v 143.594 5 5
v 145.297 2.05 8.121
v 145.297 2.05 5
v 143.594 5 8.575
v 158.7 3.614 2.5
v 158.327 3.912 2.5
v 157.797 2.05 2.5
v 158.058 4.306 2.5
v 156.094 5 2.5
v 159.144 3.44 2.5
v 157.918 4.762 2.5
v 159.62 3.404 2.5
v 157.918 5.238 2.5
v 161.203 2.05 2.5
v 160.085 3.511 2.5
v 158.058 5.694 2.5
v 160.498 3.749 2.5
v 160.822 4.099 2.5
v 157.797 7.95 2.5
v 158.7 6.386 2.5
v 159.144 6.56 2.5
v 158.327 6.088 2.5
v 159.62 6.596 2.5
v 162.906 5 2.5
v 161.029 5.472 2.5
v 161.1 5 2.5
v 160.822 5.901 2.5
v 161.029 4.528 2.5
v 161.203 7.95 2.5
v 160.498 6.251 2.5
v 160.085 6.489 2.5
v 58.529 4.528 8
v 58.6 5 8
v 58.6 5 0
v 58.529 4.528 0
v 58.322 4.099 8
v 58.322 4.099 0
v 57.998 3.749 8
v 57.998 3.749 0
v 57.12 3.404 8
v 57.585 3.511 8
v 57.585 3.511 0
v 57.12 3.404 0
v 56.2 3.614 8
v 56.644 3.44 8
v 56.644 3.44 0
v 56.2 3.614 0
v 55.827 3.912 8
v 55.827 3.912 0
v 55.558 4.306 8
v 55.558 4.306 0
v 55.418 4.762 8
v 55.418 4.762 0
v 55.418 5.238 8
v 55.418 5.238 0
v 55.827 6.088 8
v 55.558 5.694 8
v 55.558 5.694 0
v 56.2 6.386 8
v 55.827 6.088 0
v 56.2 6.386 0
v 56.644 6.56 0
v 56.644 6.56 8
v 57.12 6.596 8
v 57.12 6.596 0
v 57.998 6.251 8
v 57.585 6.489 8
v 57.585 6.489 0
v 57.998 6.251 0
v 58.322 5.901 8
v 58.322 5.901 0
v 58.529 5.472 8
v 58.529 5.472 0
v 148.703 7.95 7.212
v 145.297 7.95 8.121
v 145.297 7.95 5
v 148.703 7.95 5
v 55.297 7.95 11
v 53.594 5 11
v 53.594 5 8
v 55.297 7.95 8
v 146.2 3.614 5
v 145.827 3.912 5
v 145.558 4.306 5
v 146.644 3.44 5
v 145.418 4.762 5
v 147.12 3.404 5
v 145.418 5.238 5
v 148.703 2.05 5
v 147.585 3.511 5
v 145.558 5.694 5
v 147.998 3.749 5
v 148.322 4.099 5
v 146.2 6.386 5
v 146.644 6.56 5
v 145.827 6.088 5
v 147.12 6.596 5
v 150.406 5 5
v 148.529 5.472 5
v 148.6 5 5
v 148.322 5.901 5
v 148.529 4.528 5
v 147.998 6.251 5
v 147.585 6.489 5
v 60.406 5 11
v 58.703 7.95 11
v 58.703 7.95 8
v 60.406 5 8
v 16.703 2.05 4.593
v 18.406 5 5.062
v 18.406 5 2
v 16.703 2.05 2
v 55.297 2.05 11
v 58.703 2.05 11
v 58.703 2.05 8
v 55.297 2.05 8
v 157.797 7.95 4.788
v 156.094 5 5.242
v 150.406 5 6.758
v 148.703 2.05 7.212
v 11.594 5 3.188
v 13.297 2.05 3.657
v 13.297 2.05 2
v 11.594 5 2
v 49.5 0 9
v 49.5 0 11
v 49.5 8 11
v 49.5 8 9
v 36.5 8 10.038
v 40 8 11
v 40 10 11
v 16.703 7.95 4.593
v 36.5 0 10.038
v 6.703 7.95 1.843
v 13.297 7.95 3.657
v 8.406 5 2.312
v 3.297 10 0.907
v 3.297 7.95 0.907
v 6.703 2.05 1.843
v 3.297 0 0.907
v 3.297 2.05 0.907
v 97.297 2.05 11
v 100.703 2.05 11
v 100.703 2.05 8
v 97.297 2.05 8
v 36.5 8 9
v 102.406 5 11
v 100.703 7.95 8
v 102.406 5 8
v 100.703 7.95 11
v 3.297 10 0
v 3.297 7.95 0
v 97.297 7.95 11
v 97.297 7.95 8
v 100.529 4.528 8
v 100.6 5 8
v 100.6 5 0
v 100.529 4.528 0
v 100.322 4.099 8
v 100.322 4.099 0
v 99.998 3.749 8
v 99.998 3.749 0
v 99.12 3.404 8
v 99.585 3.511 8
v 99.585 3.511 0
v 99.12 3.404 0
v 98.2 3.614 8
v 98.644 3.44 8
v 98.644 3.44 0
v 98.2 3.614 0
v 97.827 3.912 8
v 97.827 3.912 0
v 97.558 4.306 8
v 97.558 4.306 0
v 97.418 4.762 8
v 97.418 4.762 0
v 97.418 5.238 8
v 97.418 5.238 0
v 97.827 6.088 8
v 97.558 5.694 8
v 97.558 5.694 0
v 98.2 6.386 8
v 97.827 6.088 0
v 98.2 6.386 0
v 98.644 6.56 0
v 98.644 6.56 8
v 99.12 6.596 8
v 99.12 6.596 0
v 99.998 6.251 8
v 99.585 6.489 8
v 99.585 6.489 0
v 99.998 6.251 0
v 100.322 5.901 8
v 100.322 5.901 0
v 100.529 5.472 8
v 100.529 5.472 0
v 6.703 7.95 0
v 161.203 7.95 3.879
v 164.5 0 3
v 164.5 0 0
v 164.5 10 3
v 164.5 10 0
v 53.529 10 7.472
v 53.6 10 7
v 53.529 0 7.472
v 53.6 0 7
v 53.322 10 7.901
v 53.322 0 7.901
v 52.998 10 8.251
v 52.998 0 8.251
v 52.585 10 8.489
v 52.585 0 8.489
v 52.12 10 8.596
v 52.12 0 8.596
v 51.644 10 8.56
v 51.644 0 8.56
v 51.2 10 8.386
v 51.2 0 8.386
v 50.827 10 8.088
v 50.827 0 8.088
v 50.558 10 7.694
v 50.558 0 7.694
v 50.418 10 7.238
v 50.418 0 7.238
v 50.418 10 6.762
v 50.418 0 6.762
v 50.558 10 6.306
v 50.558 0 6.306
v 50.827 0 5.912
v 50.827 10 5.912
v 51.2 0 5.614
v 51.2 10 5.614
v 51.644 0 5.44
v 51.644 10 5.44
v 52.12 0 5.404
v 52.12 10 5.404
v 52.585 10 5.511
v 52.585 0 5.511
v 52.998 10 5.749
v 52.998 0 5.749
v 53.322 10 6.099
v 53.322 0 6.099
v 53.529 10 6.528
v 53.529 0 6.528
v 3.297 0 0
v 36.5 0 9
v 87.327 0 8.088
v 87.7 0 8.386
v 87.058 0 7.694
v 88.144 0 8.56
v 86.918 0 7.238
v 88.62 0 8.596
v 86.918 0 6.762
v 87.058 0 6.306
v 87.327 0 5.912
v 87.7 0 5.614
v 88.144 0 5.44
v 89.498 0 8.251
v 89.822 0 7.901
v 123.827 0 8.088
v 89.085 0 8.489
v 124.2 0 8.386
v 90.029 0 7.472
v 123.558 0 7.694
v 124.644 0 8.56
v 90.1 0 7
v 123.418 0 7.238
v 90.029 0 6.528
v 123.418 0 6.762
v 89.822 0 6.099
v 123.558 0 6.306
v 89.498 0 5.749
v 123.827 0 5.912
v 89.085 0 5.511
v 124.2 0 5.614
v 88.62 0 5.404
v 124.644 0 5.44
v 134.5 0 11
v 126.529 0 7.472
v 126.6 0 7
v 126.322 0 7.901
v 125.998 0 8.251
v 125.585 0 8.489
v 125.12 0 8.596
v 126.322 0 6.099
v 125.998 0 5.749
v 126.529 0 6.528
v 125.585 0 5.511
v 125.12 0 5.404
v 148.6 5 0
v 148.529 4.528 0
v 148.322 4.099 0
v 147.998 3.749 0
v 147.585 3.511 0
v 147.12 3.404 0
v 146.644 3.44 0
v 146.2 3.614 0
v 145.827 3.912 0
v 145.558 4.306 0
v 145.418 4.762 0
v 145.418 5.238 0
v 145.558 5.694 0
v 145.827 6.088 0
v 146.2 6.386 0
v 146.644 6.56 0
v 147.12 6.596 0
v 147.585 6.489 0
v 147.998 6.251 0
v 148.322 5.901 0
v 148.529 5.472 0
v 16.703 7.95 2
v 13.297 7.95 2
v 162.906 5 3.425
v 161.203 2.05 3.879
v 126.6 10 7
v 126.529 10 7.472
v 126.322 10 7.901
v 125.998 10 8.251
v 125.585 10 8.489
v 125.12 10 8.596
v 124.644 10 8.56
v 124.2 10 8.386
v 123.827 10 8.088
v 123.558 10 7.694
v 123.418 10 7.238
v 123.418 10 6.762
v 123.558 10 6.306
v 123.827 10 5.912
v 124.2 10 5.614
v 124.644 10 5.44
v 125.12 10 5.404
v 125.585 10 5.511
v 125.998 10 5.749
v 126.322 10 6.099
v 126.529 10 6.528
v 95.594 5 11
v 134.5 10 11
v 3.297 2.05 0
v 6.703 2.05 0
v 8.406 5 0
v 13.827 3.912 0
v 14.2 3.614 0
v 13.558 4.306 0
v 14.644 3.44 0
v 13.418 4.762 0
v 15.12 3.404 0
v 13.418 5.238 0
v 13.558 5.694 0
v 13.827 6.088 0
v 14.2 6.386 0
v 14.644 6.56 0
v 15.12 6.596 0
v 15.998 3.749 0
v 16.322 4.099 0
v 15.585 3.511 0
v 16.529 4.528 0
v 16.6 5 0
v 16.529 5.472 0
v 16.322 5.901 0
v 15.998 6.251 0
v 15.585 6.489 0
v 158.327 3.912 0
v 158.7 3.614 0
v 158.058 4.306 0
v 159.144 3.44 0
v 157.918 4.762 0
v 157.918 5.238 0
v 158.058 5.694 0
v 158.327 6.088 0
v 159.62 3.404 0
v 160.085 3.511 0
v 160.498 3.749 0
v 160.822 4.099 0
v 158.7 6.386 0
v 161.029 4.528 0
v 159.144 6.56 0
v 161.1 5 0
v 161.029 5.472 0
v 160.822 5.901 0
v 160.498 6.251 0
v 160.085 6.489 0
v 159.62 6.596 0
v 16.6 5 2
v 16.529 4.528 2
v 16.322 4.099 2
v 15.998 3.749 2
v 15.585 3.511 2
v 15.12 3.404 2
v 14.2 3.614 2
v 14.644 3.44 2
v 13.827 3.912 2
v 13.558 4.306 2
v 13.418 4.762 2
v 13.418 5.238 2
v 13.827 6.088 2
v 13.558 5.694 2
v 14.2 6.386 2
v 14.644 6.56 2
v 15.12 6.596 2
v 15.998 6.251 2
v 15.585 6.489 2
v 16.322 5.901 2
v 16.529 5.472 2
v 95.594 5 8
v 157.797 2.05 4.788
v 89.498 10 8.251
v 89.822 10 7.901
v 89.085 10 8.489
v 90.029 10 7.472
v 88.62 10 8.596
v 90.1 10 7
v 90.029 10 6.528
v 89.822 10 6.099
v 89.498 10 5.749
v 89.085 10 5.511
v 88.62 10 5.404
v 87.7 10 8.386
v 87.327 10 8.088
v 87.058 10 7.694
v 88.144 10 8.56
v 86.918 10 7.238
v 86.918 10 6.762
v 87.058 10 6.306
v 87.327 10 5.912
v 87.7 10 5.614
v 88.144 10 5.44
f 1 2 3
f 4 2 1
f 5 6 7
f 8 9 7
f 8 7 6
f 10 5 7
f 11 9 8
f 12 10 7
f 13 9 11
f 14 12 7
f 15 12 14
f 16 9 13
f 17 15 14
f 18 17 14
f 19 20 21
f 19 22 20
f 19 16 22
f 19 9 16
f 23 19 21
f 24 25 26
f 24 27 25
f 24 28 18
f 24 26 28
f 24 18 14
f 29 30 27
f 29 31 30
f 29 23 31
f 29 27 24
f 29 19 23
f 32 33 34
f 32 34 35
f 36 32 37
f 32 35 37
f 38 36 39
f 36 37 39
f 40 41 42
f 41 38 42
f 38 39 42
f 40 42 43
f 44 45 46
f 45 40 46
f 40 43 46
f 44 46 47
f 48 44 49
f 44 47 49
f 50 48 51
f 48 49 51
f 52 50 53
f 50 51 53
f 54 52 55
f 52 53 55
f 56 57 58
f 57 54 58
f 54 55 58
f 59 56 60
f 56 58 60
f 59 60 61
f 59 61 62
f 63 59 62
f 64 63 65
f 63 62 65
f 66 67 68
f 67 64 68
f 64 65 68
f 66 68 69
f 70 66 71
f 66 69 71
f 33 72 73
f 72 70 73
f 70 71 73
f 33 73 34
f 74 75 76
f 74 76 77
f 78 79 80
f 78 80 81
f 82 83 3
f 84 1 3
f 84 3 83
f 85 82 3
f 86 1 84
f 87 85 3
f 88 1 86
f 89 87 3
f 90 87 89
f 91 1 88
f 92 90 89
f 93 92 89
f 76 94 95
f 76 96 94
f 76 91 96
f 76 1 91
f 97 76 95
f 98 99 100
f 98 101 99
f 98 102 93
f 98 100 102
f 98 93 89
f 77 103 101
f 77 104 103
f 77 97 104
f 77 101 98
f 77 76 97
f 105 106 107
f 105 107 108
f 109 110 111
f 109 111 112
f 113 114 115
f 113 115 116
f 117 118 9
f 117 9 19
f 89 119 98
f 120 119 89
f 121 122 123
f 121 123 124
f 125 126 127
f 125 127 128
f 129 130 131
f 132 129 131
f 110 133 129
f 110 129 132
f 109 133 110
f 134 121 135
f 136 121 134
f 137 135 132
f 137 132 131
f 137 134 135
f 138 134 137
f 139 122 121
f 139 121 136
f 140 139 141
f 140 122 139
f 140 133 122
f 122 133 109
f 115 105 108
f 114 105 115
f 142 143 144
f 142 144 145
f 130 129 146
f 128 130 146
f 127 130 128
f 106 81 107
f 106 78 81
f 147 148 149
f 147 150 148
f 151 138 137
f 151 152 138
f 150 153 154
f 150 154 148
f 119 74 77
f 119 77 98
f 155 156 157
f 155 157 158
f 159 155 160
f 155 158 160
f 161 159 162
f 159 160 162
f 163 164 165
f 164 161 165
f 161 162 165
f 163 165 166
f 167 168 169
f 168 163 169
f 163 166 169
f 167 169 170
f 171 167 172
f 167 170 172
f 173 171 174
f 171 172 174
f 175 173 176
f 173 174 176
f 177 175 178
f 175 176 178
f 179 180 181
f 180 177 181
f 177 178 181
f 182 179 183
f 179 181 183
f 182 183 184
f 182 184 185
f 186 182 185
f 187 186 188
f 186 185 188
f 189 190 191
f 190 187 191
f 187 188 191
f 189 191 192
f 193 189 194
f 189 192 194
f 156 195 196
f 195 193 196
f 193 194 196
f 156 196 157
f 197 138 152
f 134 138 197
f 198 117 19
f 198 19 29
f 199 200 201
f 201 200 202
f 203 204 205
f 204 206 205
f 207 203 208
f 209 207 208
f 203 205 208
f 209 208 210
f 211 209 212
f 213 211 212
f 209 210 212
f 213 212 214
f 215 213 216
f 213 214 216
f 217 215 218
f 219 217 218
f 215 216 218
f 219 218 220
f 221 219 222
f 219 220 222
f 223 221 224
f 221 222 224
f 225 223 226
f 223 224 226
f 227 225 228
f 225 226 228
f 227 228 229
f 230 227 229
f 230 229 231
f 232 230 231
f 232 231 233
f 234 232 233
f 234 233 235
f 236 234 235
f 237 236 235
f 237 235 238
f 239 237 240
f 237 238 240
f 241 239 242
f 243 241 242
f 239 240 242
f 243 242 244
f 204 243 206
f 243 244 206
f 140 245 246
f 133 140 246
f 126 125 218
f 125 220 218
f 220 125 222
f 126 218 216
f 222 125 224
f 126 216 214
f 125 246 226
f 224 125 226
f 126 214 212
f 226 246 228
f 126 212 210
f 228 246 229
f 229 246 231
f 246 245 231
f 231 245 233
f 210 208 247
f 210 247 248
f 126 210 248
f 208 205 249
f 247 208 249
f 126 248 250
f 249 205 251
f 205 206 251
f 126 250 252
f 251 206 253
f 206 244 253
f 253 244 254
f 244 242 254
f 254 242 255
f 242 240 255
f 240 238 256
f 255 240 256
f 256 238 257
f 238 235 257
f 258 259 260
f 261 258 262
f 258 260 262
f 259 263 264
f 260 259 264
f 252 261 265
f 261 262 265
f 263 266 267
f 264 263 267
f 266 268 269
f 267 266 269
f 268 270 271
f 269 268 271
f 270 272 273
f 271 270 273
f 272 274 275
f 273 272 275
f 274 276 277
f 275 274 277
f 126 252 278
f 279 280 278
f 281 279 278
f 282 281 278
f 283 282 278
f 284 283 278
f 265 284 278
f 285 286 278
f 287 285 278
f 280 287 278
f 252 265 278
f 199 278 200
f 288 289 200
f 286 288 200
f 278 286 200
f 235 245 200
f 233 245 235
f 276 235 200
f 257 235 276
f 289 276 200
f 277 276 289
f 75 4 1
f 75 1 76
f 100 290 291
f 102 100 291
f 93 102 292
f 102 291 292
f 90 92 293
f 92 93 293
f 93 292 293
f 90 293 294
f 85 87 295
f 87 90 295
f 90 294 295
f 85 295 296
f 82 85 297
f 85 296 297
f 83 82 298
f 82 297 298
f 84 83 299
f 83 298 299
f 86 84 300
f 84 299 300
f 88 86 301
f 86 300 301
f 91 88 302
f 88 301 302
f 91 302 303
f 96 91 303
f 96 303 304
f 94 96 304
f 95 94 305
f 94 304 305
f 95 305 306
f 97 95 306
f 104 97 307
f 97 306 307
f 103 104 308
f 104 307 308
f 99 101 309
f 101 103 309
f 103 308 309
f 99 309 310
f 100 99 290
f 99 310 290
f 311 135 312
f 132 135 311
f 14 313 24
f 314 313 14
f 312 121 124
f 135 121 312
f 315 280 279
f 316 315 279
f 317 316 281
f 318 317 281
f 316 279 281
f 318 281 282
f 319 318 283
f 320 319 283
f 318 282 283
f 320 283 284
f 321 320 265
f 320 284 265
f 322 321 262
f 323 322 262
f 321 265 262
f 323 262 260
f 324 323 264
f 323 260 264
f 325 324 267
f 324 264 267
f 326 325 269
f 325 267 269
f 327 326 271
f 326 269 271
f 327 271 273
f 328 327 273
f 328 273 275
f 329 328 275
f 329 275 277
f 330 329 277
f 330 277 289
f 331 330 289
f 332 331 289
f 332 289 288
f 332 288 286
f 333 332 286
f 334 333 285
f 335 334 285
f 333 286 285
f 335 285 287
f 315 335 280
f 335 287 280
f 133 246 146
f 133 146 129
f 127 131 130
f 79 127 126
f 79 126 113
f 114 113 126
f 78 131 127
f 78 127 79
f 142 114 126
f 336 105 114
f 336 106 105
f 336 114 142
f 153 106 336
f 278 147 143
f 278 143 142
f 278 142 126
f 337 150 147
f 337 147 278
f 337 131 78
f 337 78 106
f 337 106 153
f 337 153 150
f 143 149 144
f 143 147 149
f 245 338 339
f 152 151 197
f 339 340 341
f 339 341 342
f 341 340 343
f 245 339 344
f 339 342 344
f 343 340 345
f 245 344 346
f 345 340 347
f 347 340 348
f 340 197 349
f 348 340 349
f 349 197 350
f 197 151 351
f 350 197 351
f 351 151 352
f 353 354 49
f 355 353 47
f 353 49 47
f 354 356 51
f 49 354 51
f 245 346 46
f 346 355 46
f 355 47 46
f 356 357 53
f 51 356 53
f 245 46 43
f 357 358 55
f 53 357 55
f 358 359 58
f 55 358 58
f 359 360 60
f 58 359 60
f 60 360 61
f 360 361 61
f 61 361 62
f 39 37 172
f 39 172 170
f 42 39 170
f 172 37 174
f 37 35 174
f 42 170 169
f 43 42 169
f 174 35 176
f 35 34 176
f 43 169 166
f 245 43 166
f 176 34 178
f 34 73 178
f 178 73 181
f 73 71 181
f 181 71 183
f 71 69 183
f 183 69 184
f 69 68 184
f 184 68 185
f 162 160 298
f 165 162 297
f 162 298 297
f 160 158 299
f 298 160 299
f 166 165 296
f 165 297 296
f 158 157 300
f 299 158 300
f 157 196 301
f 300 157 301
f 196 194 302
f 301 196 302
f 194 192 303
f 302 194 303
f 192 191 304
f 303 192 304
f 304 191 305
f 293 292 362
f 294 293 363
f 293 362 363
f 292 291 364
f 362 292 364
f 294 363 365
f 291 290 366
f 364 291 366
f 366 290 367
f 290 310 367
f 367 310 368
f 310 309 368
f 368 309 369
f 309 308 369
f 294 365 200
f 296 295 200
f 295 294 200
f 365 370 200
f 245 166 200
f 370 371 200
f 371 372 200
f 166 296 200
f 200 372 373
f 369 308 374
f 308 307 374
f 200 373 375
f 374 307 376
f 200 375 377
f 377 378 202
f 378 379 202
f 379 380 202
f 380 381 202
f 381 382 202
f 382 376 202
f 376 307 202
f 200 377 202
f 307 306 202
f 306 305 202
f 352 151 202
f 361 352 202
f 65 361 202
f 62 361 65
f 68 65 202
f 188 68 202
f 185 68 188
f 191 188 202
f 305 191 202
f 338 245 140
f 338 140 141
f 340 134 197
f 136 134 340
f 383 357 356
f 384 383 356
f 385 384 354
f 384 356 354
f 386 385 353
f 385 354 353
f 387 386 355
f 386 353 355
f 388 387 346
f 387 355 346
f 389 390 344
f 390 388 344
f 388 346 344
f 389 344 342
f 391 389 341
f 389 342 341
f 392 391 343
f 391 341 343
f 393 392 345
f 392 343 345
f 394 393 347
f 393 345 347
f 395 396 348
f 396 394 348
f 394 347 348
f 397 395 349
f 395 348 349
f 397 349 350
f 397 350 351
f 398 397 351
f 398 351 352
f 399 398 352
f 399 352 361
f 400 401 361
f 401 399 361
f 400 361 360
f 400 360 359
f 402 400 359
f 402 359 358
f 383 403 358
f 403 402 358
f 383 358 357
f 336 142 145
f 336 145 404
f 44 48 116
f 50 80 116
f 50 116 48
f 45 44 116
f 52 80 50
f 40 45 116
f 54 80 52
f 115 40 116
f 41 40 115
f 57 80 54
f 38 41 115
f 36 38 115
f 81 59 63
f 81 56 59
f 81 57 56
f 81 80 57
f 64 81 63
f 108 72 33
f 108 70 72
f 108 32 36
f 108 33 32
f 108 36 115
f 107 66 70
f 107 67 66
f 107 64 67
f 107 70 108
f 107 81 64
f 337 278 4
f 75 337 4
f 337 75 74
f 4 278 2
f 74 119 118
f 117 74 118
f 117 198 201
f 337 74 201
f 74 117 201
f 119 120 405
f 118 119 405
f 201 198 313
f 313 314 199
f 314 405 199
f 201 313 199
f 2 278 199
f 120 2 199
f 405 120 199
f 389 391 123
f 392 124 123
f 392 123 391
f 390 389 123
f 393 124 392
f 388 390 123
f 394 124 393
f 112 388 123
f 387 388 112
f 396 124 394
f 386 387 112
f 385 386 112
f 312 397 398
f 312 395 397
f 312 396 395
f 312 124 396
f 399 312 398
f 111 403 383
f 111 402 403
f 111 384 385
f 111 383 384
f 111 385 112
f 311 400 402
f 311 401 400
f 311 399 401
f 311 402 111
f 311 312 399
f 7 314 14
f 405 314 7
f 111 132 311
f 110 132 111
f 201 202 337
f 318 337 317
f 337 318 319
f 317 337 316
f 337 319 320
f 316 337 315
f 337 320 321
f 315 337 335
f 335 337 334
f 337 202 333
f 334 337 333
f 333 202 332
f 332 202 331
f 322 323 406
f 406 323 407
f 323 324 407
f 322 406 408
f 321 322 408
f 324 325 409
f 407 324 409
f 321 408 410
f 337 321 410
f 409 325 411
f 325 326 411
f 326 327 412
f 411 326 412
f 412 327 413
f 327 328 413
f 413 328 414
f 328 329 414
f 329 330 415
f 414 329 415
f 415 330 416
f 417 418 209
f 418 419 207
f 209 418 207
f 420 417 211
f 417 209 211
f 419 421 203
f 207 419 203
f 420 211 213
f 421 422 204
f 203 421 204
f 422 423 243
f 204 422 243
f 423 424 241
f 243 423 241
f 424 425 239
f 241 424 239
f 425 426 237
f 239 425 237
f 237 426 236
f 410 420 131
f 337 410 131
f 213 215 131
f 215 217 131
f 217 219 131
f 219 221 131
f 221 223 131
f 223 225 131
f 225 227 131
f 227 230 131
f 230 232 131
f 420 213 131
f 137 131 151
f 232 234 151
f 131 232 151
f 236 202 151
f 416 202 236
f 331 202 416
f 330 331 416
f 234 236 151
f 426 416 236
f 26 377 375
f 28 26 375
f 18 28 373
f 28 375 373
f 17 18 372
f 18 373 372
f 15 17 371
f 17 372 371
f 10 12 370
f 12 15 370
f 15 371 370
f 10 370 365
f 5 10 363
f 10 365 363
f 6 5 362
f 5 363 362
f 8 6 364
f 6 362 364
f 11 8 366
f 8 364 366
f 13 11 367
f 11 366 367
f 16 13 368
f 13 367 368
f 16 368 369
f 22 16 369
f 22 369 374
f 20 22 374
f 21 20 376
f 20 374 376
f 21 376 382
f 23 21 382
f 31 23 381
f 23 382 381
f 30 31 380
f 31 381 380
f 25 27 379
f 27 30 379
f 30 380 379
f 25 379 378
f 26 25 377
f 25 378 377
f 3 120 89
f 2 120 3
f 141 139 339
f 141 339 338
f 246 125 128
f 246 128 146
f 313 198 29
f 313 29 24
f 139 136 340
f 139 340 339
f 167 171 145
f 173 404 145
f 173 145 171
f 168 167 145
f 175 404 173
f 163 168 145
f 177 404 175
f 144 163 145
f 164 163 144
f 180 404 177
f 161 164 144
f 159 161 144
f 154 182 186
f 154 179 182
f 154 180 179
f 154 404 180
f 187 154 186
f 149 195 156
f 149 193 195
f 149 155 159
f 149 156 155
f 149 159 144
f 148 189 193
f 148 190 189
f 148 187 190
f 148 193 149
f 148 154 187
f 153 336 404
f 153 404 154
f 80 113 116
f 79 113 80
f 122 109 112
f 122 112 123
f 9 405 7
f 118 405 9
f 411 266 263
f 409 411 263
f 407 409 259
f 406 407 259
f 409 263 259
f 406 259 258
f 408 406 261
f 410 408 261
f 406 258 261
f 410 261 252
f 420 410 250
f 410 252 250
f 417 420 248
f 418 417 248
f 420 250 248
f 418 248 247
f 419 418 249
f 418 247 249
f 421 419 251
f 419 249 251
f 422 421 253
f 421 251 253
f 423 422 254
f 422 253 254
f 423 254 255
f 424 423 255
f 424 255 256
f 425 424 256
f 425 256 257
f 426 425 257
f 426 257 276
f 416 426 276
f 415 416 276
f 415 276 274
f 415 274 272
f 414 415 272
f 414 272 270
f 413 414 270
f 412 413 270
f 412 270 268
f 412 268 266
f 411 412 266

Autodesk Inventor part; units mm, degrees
ref_plane "YZ Plane" through (0, 0, 0) normal (1, 0, 0) x (0, 1, 0)
ref_plane "XZ Plane" through (0, 0, 0) normal (0, 1, 0) x (-1, 0, 0)
ref_plane "XY Plane" through (0, 0, 0) normal (0, 0, 1) x (1, 0, 0)
sketch "Sketch1" plane through (0, 0, 0) normal (0, 0, 1) x (1, 0, 0)
  line L0 (0, 0) -> (164.5, 0)
  line L1 (164.5, 0) -> (164.5, 10)
  line L2 (164.5, 10) -> (0, 10)
  line L3 (0, 10) -> (0, 0)
  circle A0 centre (57, 5) radius 1.6
  circle A1 centre (99, 5) radius 1.6
  circle A2 centre (159.5, 5) radius 1.6
  circle A3 centre (147, 5) radius 1.6
  circle A4 centre (15, 5) radius 1.6
  circle A5 centre (5, 5) radius 1.6
  dimension "d1" = 10
  dimension "d2" = 90
  dimension "d4" = 3.2
  dimension "d6" = 3.2
  dimension "d7" = 3.2
  dimension "d8" = 42
  dimension "d9" = 60.5
  dimension "d26" = 3.2
  dimension "d27" = 48
  dimension "d28" = 3.2
  dimension "d29" = 42
  dimension "d32" = 15
  dimension "d33" = 5
  dimension "d61" = 3.2
  dimension "d62" = 10
  dimension "d63" = 12.5
ref_plane "Work Plane2" through (0, 0, 0) normal (0, -1, 0) x (1, 0, 0)
sketch "Sketch2" plane through (0, 0, 0) normal (0, -1, 0) x (1, 0, 0)
  circle A0 centre (52, 7) radius 1.6
  circle A1 centre (125, 7) radius 1.6
  circle A2 centre (88.5, 7) radius 1.6
  point P0 (0, 0)
  dimension "d13" = 3.2
  dimension "d15" = 3.2
  dimension "d17" = 3.2
  dimension "d18" = 36.5
  dimension "d64" = 52
  dimension "d65" = 36.5
ref_plane "Work Plane1" through (0, 0, 11) normal (0, 0, 1) x (1, 0, 0)
extrude "klocek" add sketch "Sketch1" along normal blind 11
ref_plane "Work Plane3" through (0, 0, 0) normal (0, -1, 0) x (1, 0, 0)
extrude "prowadzenie osi" cut sketch "Sketch2" against normal up to next
ref_plane "Work Plane4" through (0, 0, 0) normal (0, -1, 0) x (1, 0, 0)
sketch "Sketch7" plane through (0, 0, 0) normal (0, -1, 0) x (1, 0, 0)
  line L0 (0, 11) -> (0, 0)
  line L1 (0, 11) -> (164.5, 11) projected
  line L2 (0, 11) -> (40, 11)
  line L3 (40, 11) -> (0, 0)
  point P0 (0, -1.8333)
  dimension "d86" = 11
  dimension "d87" = 40
sketch "Sketch8" plane through (0, 0, 0) normal (0, -1, 0) x (1, 0, 0)
  line L0 (164.5, 0) -> (164.5, 11) projected
  line L1 (164.5, 11) -> (164.5, 3)
  line L2 (164.5, 11) -> (0, 11) projected
  line L3 (164.5, 11) -> (134.5, 11)
  line L4 (134.5, 11) -> (164.5, 3)
  point P0 (0, 0)
  point P1 (40.8333, 11)
  dimension "d80" = 8
  dimension "d81" = 30
extrude "przedni skos" cut sketch "Sketch7" against normal up to next
extrude "tylni skos" cut sketch "Sketch8" against normal up to next
ref_plane "Work Plane7" through (0, 0, 11) normal (0, 0, 1) x (1, 0, 0)
sketch "Sketch5" plane through (0, 0, 11) normal (0, 0, 1) x (1, 0, 0)
  circle A0 centre (99, 5) radius 1.6 projected
  line L0 (95.5936, 5) -> (97.2968, 7.95)
  line L1 (97.2968, 7.95) -> (100.7032, 7.95)
  line L2 (100.7032, 7.95) -> (102.4064, 5)
  line L3 (102.4064, 5) -> (100.7032, 2.05)
  line L4 (100.7032, 2.05) -> (97.2968, 2.05)
  line L5 (97.2968, 2.05) -> (95.5936, 5)
  circle A1 centre (57, 5) radius 1.6 projected
  line L6 (60.4064, 5) -> (58.7032, 2.05)
  line L7 (58.7032, 2.05) -> (55.2968, 2.05)
  line L8 (55.2968, 2.05) -> (53.5936, 5)
  line L9 (53.5936, 5) -> (55.2968, 7.95)
  line L10 (55.2968, 7.95) -> (58.7032, 7.95)
  line L11 (58.7032, 7.95) -> (60.4064, 5)
  point P0 (119.5, 5)
  dimension "d98" = 5.9
  dimension "d100" = 5.9
extrude "hex insert middle" cut sketch "Sketch5" against normal blind 3
ref_plane "Work Plane6" through (0, 0, 11) normal (0, 0, 1) x (1, 0, 0)
sketch "Sketch9" plane through (0, 0, 11) normal (0, 0, 1) x (1, 0, 0)
  circle A0 centre (147, 5) radius 1.6 projected
  line L0 (150.4064, 5) -> (148.7032, 2.05)
  line L1 (148.7032, 2.05) -> (145.2968, 2.05)
  line L2 (145.2968, 2.05) -> (143.5936, 5)
  line L3 (143.5936, 5) -> (145.2968, 7.95)
  line L4 (145.2968, 7.95) -> (148.7032, 7.95)
  line L5 (148.7032, 7.95) -> (150.4064, 5)
  point P0 (0, 0)
  point P1 (153, 5)
  dimension "d99" = 5.9
extrude "hex insert rear 1" cut sketch "Sketch9" against normal blind 6
ref_plane "Work Plane5" through (0, 0, 11) normal (0, 0, 1) x (1, 0, 0)
sketch "Sketch10" plane through (0, 0, 11) normal (0, 0, 1) x (1, 0, 0)
  circle A0 centre (159.5, 5) radius 1.6 projected
  line L0 (162.9064, 5) -> (161.2032, 2.05)
  line L1 (161.2032, 2.05) -> (157.7968, 2.05)
  line L2 (157.7968, 2.05) -> (156.0936, 5)
  line L3 (156.0936, 5) -> (157.7968, 7.95)
  line L4 (157.7968, 7.95) -> (161.2032, 7.95)
  line L5 (161.2032, 7.95) -> (162.9064, 5)
  point P0 (0, 0)
  dimension "d101" = 5.9
extrude "hex insert rear 2" cut sketch "Sketch10" against normal blind 8.5
sketch "Sketch13" plane through (0, 0, 11) normal (0, 0, 1) x (1, 0, 0)
  circle A0 centre (5, 5) radius 1.6 projected
  line L0 (8.4064, 5) -> (6.7032, 2.05)
  line L1 (6.7032, 2.05) -> (3.2968, 2.05)
  line L2 (3.2968, 2.05) -> (1.5936, 5)
  line L3 (1.5936, 5) -> (3.2968, 7.95)
  line L4 (3.2968, 7.95) -> (6.7032, 7.95)
  line L5 (6.7032, 7.95) -> (8.4064, 5)
  point P0 (0, 0)
  dimension "d90" = 5.9
extrude "hex insert front 1" cut sketch "Sketch13" against normal through all
sketch "Sketch16" plane through (0, 0, 11) normal (0, 0, 1) x (1, 0, 0)
  circle A0 centre (15, 5) radius 1.6 projected
  line L0 (18.4064, 5) -> (16.7032, 2.05)
  line L1 (16.7032, 2.05) -> (13.2968, 2.05)
  line L2 (13.2968, 2.05) -> (11.5936, 5)
  line L3 (11.5936, 5) -> (13.2968, 7.95)
  line L4 (13.2968, 7.95) -> (16.7032, 7.95)
  line L5 (16.7032, 7.95) -> (18.4064, 5)
  point P0 (0, 0)
  dimension "d93" = 5.9
extrude "hex insert front 2" cut sketch "Sketch16" against normal blind 9
sketch "Sketch17" plane through (0, 0, 0) normal (0, 0, -1) x (-1, 0, 0)
  line L0 (0, 10) -> (0, 0) projected
  line L1 (0, 0) -> (-3.2968, 0)
  line L2 (-3.2968, 0) -> (-3.2968, 10.0042)
  line L3 (-3.2968, 10.0042) -> (0, 10.0042)
  line L4 (0, 10.0042) -> (0, 0)
extrude "Extrusion20" cut sketch "Sketch17" against normal up to next
sketch "Sketch18" plane through (40, 0, 11) normal (0, -1, 0) x (1, 0, 0)
  line L0 (9.5, 0) -> (9.5, -2)
  line L1 (9.5, -2) -> (-3.5, -2)
  line L2 (-3.5, -2) -> (-3.5, 0)
  line L3 (-3.5, 0) -> (9.5, 0)
  line L4 (94.5, 0) -> (0, 0) projected
  circle A0 centre (12, -4) radius 1.6 projected
  line L5 (-36.7032, -11) -> (124.5, -11) projected
  point P0 (-40, -11)
  dimension "d102" = 2
  dimension "d103" = 13
  dimension "d104" = 2.5
extrude "Extrusion21" cut sketch "Sketch18" against normal blind 8 contours L0 L1 L2 L3
properties part number "wheel_support_v2"
